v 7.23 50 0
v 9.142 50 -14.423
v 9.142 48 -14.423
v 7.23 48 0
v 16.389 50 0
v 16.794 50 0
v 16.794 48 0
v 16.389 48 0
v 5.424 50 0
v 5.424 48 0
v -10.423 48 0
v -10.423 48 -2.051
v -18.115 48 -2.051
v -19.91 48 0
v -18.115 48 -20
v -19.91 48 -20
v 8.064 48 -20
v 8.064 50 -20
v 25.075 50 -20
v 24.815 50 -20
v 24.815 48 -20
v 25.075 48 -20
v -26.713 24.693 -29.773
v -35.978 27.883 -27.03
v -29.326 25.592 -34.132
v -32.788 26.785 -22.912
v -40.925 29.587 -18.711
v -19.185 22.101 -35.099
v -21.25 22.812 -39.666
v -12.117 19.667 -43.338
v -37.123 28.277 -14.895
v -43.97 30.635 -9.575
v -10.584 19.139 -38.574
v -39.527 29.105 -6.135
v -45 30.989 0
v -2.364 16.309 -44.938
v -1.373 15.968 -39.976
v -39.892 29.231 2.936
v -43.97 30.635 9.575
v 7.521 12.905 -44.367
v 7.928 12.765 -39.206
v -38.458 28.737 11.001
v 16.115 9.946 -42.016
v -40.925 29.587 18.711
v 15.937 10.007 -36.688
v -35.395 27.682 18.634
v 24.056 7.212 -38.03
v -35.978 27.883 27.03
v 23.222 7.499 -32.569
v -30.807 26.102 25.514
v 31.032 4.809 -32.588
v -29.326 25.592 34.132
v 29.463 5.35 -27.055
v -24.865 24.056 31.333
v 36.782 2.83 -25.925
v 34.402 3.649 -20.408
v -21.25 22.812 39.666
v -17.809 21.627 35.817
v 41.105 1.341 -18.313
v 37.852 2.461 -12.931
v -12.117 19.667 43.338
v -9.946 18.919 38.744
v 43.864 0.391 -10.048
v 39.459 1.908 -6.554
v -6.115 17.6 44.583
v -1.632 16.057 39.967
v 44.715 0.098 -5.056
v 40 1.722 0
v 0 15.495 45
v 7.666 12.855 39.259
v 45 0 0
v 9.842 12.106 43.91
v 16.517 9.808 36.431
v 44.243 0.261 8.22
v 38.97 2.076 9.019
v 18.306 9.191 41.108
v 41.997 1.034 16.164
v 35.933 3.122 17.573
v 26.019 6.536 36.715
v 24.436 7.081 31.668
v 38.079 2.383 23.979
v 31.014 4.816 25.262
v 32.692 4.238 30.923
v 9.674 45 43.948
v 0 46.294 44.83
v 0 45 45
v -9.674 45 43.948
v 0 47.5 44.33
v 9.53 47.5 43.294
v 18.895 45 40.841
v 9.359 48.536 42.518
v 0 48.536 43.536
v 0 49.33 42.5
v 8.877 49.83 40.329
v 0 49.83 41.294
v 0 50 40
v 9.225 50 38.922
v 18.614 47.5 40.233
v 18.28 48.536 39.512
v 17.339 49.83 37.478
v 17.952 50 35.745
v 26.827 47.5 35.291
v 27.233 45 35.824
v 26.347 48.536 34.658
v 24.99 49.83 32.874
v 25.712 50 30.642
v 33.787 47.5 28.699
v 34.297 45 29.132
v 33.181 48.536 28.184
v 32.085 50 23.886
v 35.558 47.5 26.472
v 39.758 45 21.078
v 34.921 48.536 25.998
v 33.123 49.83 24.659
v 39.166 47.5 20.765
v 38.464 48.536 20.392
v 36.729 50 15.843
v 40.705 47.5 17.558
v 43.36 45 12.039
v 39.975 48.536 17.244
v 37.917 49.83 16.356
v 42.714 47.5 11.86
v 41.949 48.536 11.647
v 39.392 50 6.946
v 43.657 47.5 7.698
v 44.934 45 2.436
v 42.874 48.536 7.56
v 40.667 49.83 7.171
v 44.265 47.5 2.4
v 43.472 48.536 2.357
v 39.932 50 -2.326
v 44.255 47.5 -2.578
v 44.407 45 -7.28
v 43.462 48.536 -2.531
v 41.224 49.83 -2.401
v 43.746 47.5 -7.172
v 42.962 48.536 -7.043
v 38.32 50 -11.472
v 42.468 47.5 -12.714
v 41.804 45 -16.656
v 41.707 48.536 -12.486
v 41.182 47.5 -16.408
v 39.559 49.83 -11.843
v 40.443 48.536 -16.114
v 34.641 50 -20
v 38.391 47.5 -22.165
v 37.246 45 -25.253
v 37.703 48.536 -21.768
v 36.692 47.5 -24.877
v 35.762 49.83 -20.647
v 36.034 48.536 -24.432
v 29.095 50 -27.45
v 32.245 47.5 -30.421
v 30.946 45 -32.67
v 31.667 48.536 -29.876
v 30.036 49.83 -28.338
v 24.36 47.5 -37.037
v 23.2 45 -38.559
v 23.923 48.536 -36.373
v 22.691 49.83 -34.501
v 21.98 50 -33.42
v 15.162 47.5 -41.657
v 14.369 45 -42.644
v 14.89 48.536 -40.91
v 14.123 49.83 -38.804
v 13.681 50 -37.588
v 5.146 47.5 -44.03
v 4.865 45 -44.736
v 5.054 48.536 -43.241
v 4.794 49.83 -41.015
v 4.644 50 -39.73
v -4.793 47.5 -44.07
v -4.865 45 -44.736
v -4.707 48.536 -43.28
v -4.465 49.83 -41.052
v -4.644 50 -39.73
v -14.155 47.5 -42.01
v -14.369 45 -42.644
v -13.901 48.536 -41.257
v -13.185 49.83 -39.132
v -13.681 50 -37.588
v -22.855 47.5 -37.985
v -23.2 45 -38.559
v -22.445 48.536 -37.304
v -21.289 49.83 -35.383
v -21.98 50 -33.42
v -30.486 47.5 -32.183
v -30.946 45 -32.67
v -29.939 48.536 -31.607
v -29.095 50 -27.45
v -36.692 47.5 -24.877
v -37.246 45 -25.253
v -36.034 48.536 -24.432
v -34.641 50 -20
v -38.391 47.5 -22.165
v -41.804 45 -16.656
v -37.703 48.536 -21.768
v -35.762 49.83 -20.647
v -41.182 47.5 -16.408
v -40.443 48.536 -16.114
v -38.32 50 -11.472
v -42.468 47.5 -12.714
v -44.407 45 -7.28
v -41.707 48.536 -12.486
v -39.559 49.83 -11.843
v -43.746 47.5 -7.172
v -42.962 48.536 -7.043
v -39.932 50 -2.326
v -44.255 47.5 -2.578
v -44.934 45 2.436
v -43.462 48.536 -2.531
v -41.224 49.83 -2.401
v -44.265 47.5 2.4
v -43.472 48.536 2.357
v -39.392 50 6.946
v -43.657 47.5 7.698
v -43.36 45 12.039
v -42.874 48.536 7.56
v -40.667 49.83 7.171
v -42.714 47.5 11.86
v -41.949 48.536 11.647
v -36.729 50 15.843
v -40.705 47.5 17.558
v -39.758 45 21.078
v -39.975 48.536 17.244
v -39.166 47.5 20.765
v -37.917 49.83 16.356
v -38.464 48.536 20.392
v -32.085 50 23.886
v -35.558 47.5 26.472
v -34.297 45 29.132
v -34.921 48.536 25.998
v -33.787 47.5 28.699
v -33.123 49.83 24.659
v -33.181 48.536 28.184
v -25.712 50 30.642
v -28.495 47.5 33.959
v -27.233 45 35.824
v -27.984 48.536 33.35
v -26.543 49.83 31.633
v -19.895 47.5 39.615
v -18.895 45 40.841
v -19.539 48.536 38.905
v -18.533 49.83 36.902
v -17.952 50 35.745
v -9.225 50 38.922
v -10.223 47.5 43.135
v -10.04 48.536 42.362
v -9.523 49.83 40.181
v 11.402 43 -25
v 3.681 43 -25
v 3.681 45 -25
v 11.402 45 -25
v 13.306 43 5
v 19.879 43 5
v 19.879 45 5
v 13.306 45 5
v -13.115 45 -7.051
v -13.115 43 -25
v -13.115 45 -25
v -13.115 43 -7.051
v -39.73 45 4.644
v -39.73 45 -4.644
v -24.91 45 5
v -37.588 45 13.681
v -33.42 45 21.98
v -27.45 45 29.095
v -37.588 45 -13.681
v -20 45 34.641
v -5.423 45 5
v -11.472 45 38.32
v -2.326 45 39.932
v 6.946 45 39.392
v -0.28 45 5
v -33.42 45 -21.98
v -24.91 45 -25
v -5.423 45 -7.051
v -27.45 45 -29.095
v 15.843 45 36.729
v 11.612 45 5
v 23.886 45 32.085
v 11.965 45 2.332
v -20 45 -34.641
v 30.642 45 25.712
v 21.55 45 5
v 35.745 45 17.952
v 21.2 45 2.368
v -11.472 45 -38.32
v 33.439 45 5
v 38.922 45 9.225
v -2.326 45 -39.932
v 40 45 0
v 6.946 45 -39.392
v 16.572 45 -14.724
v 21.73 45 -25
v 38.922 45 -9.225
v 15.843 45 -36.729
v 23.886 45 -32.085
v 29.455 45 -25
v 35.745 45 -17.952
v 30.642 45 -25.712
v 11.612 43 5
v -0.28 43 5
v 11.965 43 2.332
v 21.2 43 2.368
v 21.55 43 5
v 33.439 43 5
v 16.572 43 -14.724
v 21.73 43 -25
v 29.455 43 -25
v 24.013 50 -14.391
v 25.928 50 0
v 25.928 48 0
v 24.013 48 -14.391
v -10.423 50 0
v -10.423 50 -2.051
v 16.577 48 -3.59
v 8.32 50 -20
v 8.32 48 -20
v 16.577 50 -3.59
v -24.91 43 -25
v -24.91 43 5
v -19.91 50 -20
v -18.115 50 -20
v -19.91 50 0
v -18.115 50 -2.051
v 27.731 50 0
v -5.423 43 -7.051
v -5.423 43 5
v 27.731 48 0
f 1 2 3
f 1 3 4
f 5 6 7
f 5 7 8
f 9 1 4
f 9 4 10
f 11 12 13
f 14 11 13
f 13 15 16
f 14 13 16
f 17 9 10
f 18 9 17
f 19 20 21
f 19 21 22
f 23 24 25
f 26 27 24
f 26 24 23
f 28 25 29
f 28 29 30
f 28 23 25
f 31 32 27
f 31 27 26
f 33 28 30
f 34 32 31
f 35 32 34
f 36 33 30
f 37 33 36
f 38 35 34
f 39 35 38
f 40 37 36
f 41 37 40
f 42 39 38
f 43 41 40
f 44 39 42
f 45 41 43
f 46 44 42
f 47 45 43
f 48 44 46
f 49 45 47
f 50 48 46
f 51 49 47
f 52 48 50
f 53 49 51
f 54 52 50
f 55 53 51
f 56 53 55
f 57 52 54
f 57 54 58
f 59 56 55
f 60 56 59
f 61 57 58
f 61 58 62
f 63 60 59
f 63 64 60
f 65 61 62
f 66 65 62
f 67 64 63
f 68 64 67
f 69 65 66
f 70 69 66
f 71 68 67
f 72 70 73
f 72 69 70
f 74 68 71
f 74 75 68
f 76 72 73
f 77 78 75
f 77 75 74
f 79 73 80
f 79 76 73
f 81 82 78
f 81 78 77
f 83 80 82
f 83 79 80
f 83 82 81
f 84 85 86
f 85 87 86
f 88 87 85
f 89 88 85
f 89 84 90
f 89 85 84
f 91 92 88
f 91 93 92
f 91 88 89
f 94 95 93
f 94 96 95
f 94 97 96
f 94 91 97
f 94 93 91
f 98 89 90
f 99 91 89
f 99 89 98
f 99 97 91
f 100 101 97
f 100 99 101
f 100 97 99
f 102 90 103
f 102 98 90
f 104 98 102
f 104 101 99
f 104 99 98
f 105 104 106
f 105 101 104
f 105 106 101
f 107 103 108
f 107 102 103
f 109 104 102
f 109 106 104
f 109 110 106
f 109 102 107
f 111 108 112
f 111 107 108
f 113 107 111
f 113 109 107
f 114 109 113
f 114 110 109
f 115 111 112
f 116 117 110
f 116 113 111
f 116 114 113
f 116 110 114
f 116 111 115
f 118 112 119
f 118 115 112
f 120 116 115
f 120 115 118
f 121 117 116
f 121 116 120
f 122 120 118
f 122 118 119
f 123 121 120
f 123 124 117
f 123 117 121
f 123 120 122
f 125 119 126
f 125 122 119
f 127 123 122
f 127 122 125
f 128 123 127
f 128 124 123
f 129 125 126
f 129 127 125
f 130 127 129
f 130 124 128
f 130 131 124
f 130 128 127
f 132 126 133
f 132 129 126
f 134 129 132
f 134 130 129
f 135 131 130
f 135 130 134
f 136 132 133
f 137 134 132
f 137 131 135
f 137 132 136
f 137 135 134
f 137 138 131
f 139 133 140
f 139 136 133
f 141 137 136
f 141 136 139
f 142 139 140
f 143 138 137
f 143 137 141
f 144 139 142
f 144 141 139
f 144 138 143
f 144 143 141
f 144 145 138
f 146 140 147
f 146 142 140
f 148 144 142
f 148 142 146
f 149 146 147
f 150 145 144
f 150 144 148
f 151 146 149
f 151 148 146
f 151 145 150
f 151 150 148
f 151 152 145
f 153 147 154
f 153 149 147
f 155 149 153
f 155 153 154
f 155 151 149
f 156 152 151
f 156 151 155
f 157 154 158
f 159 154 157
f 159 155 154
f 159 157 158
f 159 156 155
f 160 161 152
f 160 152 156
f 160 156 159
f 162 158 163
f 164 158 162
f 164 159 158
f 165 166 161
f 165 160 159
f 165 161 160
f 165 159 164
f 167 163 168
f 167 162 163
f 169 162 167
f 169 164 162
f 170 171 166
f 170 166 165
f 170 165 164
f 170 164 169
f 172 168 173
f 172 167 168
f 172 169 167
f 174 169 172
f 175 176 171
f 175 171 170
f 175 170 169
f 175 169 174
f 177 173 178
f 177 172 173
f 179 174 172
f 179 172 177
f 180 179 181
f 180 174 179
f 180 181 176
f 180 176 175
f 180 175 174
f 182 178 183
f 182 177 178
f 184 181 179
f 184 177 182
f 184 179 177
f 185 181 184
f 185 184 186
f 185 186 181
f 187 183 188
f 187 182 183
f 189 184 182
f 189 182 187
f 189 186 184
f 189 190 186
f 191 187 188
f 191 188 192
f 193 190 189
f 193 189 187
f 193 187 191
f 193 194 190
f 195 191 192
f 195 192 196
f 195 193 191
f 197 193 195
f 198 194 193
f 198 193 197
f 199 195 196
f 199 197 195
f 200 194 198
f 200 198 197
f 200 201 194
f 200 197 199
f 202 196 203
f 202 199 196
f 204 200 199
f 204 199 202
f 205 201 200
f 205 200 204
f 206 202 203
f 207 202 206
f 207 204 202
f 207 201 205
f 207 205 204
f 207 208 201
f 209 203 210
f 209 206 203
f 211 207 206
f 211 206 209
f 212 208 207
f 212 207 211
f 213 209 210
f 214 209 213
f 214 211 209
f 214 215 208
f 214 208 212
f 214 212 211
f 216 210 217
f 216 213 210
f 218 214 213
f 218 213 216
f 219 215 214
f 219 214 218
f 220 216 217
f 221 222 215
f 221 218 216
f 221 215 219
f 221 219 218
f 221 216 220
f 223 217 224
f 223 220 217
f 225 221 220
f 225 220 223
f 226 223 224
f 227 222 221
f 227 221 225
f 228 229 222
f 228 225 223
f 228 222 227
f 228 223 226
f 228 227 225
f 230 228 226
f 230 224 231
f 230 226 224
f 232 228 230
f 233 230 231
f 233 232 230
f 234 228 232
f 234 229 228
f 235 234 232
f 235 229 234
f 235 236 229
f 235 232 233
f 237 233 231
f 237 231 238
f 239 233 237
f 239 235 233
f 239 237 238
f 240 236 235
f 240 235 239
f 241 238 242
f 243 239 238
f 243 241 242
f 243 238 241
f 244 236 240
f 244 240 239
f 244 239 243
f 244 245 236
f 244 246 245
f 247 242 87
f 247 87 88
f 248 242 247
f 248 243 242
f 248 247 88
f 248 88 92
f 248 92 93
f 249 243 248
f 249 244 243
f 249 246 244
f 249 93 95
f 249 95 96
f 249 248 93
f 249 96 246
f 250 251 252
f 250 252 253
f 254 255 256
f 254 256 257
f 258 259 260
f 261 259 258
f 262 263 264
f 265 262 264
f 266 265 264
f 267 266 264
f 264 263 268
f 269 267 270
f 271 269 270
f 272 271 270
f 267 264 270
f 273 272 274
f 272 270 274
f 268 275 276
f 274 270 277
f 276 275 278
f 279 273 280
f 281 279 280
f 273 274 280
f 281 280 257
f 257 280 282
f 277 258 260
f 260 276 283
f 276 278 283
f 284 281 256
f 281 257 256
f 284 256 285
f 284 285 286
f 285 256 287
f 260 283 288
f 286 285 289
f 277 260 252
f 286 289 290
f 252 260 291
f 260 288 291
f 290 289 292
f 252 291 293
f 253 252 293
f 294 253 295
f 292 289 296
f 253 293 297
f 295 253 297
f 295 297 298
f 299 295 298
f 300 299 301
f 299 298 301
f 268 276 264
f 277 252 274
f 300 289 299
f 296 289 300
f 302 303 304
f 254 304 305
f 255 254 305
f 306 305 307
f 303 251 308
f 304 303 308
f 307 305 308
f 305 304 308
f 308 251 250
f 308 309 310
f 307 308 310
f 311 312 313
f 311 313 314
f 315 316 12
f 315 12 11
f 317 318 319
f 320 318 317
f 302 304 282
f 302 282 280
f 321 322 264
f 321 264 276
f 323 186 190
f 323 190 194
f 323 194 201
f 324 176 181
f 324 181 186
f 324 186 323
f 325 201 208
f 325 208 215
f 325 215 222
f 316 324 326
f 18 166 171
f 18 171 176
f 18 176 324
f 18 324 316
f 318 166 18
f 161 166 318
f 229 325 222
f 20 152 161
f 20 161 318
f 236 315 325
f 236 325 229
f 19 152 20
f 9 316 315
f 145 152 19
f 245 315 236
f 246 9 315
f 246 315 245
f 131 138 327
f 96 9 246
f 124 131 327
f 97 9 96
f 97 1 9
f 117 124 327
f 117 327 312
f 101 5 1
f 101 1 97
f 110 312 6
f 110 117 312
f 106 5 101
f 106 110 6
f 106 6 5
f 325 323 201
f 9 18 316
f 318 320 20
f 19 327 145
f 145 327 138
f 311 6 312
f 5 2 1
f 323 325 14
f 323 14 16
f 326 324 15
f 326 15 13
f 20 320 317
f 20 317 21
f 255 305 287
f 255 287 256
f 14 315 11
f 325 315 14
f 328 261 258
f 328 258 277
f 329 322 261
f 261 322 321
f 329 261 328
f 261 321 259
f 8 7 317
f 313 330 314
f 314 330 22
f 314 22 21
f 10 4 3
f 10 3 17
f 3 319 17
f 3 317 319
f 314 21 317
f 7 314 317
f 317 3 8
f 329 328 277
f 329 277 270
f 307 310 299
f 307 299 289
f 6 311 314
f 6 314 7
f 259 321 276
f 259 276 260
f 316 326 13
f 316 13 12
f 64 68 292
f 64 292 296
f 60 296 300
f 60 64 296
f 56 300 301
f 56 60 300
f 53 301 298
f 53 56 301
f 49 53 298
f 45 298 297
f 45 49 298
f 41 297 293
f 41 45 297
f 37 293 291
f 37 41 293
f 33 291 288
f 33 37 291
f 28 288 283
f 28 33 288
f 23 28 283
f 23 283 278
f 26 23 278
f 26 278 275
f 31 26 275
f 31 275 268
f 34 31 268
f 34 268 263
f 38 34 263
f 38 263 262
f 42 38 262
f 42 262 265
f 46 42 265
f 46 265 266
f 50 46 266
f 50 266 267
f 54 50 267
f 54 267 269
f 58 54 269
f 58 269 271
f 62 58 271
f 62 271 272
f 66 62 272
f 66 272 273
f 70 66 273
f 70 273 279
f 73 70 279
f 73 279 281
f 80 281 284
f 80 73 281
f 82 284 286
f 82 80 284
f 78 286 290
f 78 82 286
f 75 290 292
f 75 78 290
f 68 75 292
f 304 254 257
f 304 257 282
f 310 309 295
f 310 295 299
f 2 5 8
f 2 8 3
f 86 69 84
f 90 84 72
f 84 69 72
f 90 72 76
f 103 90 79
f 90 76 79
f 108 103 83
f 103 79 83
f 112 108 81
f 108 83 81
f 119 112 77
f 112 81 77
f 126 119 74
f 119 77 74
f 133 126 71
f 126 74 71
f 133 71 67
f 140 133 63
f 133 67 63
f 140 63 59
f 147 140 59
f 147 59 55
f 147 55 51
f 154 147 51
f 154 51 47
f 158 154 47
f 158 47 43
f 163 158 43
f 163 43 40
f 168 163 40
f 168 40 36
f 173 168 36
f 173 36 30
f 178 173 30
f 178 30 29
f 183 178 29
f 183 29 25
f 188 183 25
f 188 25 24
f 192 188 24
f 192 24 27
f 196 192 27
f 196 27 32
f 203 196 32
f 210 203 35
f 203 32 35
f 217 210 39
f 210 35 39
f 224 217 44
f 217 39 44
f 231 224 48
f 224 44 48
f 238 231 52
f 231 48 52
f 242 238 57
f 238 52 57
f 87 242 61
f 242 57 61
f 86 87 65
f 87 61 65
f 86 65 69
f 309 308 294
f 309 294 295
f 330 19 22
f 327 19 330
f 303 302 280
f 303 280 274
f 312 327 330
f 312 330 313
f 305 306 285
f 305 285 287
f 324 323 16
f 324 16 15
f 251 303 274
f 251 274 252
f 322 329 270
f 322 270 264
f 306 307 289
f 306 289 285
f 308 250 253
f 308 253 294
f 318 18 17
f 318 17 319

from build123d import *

# Parameters (mm, degrees)
SKETCH1_R                      = 45
BOSS_EXTRUDE1_DEPTH            = 50
CUT_EXTRUDE1_REACH             = 82.932
CUT_EXTRUDE1_DIRECTION_2_REACH = 82.932
FILLET1_R                      = 5
CUT_EXTRUDE2_DEPTH             = 2
SHELL1_START                   = 1.721637966
SHELL1_OUTLINE_R               = 40
SHELL1_DEPTH                   = 41.278362034
SHELL1_START_2                 = 43
SHELL1_2_OUTLINE_R             = 40
SHELL1_2_DEPTH                 = 2


with BuildPart() as part:
    # Sketch1 → Boss-Extrude1 (new body)
    with BuildSketch(Plane(origin=(0, 0, 0), x_dir=(1, 0, 0), z_dir=(0, 1, 0))):
        with Locations(Location((0, 0, 0), (0, 0, 270))):
            Circle(SKETCH1_R)
    extrude(amount=BOSS_EXTRUDE1_DEPTH)

    # Sketch2 → Cut-Extrude1 (cut, up to next)
    with BuildSketch(Plane.XY, mode=Mode.PRIVATE) as cut_extrude1_sk1:
        Polygon((45, 0), (-45, 0), (-45, 30.989485196), align=None)
    cut_extrude1_tool1 = extrude(cut_extrude1_sk1.sketch, amount=-CUT_EXTRUDE1_REACH, mode=Mode.PRIVATE) & part.part
    add(cut_extrude1_tool1.solids().sort_by_distance((-15, 10.329828, 0))[0], mode=Mode.SUBTRACT)

    # Sketch2 → Cut-Extrude1 direction 2 (cut, up to next)
    with BuildSketch(Plane.XY, mode=Mode.PRIVATE) as cut_extrude1_direction_2_sk1:
        Polygon((45, 0), (-45, 0), (-45, 30.989485196), align=None)
    cut_extrude1_direction_2_tool1 = extrude(cut_extrude1_direction_2_sk1.sketch, amount=CUT_EXTRUDE1_DIRECTION_2_REACH, mode=Mode.PRIVATE) & part.part
    add(cut_extrude1_direction_2_tool1.solids().sort_by_distance((-15, 10.329828, 0))[0], mode=Mode.SUBTRACT)

    # Fillet1
    fillet1_edges = [part.edges().sort_by_distance(p)[0] for p in [
        (0, 50, -45),
    ]]
    fillet(fillet1_edges, radius=FILLET1_R)

    # Sketch4 → Cut-Extrude2 (cut)
    with BuildSketch(Plane(origin=(0, 50, 0), x_dir=(1, 0, 0), z_dir=(0, 1, 0))):
        Polygon((-19.909733282, 20), (-18.114861487, 20), (-18.114861487, 2.051282051), (-10.422553795, 2.051282051), (-10.422553795, 0), (-19.909733282, 0), align=None)
        Polygon((5.423600051, 0), (8.06382441, 20), (8.320234666, 20), (16.577446205, 3.58974359), (24.814625692, 20), (25.075042359, 20), (27.731292359, 0), (25.928407743, 0), (24.013343641, 14.391025641), (16.793792359, 0), (16.389144923, 0), (9.141548769, 14.423076923), (7.230491077, 0), align=None)
    extrude(amount=-CUT_EXTRUDE2_DEPTH, mode=Mode.SUBTRACT)

    # Shell1: read off the stored shape, not the designer's step
    # Shell1 outline → Shell1 (cut)
    with BuildSketch(Plane(origin=(0, 0, 0), x_dir=(1, 0, 0), z_dir=(0, 1, 0)).offset(SHELL1_START)):
        Circle(SHELL1_OUTLINE_R)
    extrude(amount=SHELL1_DEPTH, mode=Mode.SUBTRACT)

    # Shell1 2 outline → Shell1 2 (cut)
    with BuildSketch(Plane(origin=(0, 0, 0), x_dir=(1, 0, 0), z_dir=(0, 1, 0)).offset(SHELL1_START_2)):
        Circle(SHELL1_2_OUTLINE_R)
        Polygon((-5.422553795, 7.051282051), (-5.422553795, -5), (-24.909733282, -5), (-24.909733282, 25), (-13.114861487, 25), (-13.114861487, 7.051282051), align=None, mode=Mode.SUBTRACT)
        Polygon((11.965201342, -2.331995426), (11.611690736, -5), (-0.279835267, -5), (3.680501271, 25), (11.401650362, 25), (16.572020474, 14.72448521), (21.729847234, 25), (29.454884993, 25), (33.439259993, -5), (21.549698117, -5), (21.1995112, -2.368469859), (19.879350477, -5), (13.30587364, -5), align=None, mode=Mode.SUBTRACT)
    extrude(amount=SHELL1_2_DEPTH, mode=Mode.SUBTRACT)


solid = part.part
